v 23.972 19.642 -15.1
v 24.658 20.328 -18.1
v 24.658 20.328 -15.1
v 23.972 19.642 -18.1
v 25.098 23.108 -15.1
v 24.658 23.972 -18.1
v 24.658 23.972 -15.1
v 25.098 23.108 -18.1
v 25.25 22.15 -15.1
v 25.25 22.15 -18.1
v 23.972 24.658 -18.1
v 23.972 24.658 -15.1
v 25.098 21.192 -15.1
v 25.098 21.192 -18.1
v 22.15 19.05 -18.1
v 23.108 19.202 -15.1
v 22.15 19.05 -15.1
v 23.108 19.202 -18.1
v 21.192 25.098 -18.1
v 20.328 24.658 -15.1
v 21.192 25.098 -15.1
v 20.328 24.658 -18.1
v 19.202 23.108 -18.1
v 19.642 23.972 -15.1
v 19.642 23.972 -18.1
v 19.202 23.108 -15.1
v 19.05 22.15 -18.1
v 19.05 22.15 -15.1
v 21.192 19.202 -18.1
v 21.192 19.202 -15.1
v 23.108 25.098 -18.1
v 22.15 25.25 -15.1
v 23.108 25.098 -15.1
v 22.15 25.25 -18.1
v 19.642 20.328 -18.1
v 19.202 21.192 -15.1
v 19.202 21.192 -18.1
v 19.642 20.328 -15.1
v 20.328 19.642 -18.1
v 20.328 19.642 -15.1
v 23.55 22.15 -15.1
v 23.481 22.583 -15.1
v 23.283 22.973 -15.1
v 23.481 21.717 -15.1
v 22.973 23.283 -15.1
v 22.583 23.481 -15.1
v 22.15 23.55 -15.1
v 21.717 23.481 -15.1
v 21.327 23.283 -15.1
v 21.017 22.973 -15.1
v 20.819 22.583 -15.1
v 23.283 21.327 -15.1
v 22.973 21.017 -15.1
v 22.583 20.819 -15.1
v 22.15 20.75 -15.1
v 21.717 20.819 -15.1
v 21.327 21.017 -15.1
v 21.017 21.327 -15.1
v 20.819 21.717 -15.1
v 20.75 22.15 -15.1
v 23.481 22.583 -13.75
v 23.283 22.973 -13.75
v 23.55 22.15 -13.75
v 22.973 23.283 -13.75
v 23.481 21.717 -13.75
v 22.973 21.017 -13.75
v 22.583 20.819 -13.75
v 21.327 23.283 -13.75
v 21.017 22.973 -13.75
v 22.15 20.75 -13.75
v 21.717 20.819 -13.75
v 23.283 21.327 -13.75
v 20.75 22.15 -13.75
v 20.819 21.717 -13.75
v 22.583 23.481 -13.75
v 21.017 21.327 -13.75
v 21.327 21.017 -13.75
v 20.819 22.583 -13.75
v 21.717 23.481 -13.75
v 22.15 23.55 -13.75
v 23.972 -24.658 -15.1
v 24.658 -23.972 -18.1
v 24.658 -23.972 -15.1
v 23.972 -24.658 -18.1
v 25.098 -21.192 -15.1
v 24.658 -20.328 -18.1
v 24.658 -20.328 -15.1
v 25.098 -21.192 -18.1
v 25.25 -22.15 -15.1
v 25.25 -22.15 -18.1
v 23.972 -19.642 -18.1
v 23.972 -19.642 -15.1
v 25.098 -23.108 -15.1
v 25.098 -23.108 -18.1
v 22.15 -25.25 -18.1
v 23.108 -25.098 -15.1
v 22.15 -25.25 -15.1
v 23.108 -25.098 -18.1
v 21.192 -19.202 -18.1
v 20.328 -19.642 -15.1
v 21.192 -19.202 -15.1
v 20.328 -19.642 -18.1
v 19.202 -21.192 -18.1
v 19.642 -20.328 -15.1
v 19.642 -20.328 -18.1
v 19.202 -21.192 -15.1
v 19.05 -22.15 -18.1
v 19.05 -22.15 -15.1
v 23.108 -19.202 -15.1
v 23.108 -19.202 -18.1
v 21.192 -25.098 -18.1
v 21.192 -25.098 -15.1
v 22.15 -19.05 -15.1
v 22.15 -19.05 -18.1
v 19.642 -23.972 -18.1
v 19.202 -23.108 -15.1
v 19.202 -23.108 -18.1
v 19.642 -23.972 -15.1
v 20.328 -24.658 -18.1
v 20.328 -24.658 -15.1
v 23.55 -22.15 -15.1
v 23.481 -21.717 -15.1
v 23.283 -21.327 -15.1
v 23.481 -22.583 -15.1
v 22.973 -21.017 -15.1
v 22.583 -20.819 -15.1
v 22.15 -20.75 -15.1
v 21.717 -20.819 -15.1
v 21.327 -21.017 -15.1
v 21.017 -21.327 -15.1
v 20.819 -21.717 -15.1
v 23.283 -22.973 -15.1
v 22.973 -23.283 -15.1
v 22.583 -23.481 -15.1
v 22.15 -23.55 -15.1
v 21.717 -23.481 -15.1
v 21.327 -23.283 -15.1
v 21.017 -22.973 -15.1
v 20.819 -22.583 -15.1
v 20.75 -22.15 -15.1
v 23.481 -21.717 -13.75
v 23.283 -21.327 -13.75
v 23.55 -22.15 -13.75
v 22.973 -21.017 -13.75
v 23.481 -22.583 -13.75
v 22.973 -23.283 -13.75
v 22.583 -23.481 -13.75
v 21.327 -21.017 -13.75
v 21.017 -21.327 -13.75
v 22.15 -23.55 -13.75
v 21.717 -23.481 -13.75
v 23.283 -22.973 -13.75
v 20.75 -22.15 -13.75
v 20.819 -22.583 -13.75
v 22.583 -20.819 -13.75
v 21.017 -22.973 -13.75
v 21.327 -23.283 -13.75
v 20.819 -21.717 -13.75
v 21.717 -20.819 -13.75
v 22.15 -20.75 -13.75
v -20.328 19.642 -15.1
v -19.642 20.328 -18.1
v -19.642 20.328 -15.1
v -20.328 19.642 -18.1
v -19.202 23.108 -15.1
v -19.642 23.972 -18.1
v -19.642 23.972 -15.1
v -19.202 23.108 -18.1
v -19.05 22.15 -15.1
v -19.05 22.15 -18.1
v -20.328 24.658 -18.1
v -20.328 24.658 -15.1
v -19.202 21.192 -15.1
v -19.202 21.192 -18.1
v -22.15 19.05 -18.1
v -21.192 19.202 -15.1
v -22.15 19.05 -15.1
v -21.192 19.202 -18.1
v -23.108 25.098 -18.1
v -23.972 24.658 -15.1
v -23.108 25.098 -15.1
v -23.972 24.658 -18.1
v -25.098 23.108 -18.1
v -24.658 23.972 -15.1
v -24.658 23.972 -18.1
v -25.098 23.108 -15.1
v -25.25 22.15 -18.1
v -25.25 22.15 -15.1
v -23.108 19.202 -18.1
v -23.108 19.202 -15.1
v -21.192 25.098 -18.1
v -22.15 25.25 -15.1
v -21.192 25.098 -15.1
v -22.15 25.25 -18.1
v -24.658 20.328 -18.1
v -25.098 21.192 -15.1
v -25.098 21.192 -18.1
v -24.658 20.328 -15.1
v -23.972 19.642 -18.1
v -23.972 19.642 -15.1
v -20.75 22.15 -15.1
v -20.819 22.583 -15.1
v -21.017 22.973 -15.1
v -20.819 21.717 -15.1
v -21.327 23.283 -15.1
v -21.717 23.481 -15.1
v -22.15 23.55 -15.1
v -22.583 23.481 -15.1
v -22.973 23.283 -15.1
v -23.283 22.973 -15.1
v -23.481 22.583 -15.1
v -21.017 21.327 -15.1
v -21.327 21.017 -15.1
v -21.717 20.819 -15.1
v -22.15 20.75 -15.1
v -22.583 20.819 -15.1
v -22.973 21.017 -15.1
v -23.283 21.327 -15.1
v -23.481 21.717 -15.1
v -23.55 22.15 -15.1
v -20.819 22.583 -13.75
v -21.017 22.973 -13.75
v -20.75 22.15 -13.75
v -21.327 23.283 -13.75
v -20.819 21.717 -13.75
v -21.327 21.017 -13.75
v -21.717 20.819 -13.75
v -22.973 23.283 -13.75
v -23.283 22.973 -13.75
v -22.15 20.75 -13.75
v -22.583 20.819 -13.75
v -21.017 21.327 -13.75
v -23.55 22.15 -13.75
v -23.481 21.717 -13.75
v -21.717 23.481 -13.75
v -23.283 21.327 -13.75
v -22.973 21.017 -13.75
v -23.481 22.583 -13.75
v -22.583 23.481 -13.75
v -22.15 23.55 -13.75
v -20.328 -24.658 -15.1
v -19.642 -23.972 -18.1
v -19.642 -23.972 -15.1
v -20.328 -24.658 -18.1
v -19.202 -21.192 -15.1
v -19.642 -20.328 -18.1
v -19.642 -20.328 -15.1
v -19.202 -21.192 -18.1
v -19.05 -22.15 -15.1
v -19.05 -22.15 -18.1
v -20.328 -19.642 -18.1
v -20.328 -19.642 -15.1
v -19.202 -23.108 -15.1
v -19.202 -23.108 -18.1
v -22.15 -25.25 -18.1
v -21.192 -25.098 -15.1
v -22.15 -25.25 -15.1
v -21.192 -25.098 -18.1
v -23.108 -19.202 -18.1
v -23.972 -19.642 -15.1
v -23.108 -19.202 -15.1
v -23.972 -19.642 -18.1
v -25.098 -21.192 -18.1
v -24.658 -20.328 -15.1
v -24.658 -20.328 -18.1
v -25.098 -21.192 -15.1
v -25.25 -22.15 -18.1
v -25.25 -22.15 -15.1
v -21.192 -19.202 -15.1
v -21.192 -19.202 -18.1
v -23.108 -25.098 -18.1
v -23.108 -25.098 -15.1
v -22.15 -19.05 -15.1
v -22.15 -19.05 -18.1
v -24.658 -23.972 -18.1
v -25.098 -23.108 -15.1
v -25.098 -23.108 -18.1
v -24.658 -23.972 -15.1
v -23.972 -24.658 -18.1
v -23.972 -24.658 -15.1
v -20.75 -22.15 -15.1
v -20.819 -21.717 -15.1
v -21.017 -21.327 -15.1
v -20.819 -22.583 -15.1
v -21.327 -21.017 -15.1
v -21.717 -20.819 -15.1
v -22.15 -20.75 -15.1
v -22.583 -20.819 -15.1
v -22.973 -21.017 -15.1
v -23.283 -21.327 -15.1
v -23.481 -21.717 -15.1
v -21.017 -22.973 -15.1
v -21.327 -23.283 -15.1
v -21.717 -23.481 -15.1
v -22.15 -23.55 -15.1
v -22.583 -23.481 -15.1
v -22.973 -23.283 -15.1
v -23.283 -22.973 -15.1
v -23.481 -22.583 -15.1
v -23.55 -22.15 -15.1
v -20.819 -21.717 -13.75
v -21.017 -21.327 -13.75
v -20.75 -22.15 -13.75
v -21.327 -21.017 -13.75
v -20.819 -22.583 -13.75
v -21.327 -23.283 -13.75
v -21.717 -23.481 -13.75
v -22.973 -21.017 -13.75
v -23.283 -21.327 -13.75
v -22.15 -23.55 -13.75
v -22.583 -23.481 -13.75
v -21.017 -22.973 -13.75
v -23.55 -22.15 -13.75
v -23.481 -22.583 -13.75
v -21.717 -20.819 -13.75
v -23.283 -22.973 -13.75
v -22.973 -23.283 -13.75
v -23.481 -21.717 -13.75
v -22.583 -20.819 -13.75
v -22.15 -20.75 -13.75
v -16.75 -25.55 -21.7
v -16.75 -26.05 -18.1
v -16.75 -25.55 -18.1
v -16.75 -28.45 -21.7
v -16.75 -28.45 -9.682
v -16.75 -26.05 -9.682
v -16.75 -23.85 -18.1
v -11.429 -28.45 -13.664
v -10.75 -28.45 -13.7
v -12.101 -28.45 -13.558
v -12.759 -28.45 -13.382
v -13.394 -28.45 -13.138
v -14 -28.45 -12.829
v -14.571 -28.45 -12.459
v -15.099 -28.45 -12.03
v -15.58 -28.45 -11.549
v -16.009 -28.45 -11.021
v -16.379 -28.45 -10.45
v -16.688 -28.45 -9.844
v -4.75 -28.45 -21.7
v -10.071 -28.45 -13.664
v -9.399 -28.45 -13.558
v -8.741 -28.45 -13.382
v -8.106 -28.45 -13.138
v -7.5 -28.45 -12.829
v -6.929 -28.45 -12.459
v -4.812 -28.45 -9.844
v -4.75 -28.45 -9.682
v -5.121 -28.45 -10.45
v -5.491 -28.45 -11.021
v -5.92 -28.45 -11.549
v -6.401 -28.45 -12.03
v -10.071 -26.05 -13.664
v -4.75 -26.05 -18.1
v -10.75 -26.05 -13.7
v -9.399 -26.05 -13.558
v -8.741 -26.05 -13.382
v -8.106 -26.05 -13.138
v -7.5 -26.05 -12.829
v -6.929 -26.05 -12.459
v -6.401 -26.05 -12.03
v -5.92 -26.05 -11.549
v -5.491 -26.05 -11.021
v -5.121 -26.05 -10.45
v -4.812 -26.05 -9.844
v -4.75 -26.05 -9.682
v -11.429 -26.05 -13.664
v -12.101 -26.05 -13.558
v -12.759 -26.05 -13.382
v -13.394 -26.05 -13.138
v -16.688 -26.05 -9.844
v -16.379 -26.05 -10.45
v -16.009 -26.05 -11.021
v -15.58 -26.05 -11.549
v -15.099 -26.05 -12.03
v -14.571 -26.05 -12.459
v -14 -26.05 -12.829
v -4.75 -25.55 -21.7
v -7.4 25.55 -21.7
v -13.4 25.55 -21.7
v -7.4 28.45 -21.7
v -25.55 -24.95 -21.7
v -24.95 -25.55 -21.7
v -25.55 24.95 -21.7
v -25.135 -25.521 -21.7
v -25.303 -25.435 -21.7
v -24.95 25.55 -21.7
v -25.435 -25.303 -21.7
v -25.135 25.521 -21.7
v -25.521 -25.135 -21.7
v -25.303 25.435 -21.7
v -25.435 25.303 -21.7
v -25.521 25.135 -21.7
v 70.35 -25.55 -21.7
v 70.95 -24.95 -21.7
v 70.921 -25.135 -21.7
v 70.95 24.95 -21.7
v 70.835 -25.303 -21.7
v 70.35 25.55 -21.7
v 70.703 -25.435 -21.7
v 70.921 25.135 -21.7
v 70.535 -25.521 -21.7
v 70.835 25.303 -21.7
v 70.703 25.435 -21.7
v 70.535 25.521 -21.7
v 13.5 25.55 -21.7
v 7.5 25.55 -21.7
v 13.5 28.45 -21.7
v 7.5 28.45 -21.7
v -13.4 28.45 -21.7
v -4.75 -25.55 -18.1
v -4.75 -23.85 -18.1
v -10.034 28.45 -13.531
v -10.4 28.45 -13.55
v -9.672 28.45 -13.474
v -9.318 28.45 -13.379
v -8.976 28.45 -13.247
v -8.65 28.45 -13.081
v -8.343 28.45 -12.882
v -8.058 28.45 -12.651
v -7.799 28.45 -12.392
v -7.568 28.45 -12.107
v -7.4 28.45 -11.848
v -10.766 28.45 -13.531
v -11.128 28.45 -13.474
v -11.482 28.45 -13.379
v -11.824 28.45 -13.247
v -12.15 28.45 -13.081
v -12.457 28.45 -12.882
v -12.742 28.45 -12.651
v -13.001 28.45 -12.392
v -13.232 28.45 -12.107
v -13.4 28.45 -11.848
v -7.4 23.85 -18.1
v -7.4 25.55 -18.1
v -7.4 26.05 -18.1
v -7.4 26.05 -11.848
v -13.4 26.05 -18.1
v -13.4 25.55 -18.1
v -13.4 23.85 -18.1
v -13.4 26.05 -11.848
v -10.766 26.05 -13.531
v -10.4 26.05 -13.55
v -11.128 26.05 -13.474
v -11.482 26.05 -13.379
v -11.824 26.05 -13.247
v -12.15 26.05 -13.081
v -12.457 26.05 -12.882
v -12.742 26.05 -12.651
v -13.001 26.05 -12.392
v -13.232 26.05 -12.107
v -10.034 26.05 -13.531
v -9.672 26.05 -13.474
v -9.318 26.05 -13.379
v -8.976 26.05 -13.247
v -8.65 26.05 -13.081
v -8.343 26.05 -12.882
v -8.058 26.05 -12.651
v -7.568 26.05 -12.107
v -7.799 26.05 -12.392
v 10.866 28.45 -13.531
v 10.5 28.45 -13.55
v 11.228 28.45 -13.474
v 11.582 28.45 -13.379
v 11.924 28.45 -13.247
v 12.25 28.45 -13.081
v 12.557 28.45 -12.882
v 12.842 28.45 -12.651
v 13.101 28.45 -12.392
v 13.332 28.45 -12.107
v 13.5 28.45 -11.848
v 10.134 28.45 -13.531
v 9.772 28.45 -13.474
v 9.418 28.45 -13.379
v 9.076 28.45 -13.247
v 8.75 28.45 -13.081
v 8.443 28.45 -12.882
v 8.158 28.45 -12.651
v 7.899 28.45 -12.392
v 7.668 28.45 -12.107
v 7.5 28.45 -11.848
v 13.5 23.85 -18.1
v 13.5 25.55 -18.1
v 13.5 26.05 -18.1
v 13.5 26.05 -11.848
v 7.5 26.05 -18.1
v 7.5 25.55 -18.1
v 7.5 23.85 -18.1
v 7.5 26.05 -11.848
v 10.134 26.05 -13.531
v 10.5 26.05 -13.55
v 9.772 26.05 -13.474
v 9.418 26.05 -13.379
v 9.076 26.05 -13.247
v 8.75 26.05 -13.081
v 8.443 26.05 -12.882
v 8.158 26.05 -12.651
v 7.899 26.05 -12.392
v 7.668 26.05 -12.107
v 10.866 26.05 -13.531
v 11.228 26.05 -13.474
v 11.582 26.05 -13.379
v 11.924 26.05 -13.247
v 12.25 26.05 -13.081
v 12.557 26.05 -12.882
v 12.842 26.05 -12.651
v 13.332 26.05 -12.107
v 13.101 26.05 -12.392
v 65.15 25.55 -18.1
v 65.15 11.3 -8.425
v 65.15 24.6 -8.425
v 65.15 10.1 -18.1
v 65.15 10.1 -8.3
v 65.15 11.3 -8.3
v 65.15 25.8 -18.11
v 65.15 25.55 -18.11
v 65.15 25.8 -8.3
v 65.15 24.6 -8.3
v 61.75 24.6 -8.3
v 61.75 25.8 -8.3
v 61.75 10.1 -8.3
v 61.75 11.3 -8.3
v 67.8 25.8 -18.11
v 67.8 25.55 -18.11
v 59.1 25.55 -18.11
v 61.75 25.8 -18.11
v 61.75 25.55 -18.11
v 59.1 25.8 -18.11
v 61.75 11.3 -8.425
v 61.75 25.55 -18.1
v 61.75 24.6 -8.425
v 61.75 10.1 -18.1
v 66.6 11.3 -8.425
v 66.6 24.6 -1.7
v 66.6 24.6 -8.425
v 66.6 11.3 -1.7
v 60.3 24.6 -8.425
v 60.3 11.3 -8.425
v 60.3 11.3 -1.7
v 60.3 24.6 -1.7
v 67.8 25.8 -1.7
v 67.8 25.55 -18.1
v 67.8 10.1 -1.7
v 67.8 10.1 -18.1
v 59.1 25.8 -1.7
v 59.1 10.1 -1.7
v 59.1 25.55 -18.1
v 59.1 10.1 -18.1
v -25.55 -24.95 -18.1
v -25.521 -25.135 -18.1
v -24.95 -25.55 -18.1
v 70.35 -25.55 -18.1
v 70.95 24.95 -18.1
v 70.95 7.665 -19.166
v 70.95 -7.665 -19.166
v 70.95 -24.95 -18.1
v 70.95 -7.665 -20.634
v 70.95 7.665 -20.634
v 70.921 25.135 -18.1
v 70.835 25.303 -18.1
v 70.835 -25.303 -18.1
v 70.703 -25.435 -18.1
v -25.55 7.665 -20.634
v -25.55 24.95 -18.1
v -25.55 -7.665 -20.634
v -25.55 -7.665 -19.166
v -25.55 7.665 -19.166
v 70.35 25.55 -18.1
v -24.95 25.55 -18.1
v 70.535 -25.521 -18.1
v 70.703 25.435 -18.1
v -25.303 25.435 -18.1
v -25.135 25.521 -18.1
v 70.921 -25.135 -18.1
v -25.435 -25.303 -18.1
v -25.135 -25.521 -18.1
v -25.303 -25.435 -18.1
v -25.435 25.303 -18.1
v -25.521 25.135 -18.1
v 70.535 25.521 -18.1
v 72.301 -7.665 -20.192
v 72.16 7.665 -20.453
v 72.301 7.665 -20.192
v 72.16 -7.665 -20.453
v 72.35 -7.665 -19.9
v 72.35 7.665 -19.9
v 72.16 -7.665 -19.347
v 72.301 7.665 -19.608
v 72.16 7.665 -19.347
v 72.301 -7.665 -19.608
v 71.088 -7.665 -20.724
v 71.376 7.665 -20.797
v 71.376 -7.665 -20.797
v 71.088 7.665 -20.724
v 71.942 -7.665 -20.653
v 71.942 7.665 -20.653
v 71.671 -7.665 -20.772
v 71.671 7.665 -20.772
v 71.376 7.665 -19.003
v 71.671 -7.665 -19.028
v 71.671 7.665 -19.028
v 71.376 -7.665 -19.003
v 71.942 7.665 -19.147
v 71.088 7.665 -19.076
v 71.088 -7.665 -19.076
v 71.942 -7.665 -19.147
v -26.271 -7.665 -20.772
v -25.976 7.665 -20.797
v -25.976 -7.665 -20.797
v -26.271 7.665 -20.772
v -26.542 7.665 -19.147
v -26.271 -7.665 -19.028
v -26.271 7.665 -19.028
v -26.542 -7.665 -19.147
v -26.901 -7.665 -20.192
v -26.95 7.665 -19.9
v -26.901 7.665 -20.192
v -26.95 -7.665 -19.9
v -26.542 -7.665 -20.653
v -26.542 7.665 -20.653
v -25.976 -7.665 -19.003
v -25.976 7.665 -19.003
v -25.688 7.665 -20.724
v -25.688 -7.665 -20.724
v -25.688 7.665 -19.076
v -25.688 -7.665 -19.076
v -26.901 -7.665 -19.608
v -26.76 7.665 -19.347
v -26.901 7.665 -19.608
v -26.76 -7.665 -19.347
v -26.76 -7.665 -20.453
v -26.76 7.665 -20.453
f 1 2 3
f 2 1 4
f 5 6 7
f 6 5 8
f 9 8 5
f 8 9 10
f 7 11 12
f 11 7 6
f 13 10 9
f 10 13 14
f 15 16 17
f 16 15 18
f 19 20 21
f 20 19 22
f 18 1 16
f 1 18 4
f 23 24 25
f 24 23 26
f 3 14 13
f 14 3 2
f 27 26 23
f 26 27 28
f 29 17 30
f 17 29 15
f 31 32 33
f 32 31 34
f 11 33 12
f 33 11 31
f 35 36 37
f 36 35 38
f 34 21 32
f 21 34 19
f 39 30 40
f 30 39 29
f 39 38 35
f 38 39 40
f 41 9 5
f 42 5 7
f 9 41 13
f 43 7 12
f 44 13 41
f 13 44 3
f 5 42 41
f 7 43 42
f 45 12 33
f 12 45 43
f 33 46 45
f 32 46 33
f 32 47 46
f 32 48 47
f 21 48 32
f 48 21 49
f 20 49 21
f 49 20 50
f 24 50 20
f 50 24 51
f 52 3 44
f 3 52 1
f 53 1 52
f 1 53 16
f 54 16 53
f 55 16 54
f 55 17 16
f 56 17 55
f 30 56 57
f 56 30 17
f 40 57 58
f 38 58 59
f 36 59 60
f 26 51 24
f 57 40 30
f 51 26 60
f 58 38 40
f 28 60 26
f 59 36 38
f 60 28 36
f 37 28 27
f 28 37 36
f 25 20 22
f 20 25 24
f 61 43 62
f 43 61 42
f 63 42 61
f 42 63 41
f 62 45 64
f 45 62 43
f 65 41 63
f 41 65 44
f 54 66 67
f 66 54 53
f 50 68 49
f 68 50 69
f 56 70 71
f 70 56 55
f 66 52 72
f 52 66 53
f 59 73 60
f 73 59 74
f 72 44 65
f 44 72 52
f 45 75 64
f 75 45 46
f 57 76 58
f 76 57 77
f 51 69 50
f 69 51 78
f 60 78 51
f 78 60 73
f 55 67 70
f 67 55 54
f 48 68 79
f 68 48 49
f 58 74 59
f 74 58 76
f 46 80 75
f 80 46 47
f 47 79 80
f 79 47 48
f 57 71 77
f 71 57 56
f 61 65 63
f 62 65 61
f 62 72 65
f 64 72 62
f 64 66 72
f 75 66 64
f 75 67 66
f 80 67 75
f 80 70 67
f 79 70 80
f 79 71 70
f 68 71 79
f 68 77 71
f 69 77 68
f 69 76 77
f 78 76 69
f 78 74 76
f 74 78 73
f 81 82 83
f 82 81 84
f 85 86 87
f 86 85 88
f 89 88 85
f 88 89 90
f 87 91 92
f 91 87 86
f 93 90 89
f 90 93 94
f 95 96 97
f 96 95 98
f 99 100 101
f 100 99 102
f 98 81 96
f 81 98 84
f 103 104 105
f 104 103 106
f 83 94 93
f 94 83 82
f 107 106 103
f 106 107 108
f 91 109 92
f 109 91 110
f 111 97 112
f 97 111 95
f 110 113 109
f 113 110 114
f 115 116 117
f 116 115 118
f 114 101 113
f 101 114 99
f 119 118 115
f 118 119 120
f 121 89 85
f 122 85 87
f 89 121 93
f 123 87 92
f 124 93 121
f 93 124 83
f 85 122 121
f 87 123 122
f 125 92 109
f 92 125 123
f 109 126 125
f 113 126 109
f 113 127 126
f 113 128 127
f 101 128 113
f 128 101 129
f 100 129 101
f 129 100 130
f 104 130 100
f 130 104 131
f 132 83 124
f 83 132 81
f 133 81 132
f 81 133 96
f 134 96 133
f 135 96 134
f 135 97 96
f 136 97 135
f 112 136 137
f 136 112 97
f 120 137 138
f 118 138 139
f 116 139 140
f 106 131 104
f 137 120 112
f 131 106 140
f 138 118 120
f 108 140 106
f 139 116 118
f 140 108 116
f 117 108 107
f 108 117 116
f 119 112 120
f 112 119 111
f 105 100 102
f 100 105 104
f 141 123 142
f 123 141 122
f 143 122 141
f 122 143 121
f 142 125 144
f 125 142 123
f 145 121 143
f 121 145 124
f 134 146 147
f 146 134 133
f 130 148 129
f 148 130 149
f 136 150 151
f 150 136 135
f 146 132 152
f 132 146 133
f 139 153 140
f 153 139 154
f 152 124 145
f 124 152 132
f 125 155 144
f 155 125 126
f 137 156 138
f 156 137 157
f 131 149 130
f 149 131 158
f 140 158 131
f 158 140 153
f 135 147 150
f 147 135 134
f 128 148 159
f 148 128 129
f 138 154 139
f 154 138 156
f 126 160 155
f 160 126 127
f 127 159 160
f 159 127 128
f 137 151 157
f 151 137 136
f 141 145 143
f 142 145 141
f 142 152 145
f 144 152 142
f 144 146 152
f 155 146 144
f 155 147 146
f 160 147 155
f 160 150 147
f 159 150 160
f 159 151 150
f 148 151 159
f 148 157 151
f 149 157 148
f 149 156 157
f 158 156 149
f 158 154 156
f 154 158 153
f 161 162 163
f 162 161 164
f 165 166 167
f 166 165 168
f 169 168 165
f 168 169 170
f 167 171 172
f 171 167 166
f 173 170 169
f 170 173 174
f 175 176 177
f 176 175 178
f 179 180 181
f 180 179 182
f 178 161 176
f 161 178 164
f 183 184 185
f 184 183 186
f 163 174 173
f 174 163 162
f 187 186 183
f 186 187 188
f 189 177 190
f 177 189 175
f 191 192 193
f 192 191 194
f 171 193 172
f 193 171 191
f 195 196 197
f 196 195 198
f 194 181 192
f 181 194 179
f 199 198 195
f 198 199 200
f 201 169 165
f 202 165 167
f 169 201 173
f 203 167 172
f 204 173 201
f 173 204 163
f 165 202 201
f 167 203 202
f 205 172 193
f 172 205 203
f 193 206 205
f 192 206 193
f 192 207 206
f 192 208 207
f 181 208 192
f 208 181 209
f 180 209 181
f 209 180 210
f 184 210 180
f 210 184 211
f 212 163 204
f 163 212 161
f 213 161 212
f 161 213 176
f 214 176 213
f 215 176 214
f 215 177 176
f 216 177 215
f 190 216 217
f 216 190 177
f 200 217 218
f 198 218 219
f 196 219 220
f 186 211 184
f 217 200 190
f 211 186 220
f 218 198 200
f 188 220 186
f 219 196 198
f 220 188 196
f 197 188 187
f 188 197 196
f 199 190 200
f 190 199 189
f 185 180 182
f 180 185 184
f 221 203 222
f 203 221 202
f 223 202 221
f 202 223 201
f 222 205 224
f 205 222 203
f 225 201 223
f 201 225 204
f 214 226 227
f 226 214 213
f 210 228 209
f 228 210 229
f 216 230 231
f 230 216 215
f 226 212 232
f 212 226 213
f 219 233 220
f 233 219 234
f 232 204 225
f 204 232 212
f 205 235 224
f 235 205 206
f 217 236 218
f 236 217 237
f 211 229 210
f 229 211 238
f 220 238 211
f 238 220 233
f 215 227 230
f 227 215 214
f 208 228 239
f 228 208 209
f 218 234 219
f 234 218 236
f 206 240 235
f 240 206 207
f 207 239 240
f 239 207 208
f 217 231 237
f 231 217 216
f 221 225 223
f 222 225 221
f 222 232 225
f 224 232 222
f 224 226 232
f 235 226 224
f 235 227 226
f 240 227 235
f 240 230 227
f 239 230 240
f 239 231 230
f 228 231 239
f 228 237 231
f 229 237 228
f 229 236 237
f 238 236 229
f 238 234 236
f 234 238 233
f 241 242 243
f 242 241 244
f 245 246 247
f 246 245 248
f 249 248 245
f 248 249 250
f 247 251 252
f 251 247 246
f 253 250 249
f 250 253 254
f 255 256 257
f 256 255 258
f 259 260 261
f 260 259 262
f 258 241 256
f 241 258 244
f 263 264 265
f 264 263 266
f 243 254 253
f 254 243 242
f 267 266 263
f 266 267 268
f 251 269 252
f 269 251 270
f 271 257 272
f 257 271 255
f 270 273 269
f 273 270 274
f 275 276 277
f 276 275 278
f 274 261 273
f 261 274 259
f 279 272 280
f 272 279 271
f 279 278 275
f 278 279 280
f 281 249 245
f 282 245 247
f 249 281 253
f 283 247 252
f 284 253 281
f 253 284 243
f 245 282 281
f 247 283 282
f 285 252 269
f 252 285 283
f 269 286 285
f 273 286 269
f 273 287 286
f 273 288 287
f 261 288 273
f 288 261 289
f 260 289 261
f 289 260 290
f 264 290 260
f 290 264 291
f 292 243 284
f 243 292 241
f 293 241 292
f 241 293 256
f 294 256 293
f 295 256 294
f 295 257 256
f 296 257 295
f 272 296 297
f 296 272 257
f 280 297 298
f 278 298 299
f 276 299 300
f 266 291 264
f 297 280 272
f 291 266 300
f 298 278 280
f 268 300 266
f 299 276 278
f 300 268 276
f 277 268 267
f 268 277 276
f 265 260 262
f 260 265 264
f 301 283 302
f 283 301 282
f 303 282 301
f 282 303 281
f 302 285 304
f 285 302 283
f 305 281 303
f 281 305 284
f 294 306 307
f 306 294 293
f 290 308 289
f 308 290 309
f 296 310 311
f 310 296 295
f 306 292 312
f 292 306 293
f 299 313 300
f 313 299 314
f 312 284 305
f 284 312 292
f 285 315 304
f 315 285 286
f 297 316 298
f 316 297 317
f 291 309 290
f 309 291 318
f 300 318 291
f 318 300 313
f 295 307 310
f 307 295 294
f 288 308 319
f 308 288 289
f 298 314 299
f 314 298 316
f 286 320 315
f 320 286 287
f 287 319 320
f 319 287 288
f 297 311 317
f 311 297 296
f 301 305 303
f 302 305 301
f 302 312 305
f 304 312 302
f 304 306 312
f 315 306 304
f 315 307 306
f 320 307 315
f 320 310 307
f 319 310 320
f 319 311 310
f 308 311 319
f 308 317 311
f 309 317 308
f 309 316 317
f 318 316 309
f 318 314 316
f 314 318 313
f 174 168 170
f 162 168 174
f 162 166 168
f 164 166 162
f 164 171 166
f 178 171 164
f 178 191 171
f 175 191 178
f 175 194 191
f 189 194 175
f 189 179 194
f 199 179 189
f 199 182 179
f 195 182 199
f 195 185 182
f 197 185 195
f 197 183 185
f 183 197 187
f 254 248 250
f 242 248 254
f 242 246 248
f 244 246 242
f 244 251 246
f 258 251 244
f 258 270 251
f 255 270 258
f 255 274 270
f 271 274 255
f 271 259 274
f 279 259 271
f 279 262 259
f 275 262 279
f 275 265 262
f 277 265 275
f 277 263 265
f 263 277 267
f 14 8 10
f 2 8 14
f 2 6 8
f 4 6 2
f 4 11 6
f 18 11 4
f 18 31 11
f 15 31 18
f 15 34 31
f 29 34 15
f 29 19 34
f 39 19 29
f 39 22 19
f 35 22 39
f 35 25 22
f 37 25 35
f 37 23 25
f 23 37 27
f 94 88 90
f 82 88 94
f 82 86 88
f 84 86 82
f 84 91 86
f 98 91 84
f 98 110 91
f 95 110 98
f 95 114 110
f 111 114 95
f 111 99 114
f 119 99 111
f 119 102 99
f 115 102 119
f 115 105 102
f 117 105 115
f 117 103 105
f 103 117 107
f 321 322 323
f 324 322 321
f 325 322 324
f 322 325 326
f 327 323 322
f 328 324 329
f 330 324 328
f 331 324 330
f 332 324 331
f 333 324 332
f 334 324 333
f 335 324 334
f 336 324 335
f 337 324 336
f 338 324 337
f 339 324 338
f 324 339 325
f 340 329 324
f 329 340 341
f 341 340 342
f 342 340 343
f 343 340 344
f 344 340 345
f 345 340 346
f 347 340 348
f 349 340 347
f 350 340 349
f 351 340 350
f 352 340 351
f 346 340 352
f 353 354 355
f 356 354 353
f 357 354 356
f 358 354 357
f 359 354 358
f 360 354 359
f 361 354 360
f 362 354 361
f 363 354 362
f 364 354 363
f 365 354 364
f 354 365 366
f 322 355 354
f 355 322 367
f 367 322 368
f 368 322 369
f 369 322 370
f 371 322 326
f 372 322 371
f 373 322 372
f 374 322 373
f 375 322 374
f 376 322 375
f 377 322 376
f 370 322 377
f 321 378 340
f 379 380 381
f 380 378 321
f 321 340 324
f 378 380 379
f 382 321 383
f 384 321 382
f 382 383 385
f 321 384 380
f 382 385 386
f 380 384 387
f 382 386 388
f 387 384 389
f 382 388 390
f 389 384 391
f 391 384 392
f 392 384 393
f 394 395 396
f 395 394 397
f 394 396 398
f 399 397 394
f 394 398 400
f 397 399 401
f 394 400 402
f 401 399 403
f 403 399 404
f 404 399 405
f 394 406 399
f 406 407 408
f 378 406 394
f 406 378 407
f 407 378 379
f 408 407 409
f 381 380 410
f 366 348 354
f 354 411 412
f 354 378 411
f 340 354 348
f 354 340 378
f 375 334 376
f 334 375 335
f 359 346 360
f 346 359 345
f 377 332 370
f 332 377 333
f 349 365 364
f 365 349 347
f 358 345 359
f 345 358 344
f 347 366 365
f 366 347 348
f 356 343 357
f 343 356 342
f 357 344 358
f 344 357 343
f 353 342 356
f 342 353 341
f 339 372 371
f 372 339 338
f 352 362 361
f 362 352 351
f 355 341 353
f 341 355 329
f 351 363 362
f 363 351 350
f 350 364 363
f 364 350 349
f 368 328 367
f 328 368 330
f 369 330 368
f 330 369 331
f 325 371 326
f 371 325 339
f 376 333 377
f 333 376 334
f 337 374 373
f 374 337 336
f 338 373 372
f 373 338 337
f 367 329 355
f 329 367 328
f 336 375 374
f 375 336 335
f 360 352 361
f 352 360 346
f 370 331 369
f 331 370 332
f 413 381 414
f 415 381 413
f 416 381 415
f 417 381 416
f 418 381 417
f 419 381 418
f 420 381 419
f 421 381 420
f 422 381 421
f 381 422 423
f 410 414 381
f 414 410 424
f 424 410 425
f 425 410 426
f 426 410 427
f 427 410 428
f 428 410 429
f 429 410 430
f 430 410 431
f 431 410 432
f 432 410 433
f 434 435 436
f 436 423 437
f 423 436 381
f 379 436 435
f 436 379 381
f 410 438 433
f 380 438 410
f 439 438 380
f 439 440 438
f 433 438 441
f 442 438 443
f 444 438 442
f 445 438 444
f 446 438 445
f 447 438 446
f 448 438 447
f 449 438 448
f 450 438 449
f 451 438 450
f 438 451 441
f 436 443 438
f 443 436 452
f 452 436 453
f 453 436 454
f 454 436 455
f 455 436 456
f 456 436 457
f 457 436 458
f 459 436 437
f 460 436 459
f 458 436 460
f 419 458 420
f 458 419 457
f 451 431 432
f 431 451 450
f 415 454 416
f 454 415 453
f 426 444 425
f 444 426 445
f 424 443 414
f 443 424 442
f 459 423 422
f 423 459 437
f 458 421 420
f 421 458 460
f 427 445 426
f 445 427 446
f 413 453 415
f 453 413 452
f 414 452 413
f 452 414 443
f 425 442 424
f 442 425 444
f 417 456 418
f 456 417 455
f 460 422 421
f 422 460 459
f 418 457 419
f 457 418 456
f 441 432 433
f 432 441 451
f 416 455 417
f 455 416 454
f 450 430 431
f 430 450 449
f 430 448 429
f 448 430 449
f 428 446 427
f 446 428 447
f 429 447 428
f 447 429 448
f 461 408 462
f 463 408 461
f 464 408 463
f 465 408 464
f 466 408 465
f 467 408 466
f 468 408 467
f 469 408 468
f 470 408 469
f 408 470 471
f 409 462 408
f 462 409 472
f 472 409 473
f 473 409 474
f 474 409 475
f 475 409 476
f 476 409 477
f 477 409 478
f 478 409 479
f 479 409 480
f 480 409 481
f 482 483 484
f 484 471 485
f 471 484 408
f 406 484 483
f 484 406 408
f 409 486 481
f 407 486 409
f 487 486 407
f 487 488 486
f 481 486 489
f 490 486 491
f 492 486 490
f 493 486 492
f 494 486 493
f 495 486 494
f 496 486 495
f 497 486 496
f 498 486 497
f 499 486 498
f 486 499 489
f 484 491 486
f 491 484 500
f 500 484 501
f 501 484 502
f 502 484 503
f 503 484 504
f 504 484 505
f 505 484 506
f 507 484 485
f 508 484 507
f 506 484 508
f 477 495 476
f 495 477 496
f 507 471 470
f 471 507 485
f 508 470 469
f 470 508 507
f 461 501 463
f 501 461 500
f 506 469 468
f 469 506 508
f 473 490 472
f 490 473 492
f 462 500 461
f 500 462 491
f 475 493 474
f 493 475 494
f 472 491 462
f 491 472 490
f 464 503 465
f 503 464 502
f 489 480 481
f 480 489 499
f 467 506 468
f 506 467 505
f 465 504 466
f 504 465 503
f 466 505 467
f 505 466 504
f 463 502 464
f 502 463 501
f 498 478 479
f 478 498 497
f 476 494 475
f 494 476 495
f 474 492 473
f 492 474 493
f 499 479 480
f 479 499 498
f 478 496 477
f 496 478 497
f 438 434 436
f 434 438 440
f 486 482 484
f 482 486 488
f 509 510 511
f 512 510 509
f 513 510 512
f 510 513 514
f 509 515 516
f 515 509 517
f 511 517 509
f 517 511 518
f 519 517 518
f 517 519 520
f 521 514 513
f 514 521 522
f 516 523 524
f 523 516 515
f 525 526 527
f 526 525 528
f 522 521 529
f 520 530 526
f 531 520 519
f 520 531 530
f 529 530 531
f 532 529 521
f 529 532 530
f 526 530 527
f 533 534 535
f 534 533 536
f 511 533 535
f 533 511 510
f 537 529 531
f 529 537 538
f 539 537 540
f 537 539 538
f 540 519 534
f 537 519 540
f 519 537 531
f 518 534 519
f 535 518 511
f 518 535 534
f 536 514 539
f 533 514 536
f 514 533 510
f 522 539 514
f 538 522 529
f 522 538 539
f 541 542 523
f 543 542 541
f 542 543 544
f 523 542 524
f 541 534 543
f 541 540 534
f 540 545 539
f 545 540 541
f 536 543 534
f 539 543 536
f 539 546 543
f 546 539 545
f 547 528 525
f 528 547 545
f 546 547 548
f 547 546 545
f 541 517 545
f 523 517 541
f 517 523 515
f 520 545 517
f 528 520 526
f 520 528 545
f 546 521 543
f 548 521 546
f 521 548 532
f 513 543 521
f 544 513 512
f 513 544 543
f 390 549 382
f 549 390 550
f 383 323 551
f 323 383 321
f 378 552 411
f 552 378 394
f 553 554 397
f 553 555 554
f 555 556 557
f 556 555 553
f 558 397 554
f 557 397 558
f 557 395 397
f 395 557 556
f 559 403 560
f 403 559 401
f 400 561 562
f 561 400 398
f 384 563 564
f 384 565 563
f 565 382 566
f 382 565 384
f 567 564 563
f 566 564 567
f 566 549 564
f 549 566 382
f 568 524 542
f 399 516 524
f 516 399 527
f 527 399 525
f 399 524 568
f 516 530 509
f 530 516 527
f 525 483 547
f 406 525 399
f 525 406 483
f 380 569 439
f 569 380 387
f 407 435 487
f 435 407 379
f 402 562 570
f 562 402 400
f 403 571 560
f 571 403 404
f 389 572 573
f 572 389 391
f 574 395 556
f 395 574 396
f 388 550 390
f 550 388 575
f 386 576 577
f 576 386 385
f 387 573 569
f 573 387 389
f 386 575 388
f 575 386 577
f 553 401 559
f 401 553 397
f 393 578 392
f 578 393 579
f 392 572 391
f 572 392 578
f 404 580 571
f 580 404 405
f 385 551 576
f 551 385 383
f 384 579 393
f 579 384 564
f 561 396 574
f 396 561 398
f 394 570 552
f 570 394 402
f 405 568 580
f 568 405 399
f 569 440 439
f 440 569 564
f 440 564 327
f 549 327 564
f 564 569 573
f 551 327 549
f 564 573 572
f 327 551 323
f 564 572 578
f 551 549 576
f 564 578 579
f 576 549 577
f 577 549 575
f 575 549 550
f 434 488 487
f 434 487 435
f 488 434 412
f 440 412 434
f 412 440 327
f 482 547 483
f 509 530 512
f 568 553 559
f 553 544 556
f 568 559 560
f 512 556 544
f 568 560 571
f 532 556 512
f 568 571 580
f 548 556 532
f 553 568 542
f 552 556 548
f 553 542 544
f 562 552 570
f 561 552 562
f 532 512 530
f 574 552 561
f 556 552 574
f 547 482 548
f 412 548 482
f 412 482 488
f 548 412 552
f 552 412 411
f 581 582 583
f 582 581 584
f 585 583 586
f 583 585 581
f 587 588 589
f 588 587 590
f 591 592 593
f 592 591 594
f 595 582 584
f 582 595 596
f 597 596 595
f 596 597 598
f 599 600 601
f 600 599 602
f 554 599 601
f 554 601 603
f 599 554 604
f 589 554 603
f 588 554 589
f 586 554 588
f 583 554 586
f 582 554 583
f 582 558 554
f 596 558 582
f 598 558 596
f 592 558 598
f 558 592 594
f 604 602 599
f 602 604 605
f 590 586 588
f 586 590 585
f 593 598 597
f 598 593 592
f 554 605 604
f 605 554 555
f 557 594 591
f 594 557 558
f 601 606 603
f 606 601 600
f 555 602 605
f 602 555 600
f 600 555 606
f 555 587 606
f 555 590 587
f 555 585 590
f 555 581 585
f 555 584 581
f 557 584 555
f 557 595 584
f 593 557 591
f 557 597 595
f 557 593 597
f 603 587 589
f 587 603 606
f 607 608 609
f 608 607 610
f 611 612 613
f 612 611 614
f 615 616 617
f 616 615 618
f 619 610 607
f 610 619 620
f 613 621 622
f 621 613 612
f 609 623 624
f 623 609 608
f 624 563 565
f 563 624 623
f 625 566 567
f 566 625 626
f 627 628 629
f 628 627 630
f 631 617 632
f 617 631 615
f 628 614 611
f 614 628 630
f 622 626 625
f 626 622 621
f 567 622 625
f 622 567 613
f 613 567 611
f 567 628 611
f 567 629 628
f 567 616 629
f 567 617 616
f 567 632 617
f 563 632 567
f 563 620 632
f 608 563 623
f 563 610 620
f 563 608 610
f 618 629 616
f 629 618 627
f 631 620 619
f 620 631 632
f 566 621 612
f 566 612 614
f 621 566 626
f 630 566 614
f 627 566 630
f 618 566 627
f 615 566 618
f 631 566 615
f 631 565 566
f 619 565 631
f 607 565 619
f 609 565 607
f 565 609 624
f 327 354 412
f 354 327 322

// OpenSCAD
//
//  case for "pixie" 2 transistor 40 m band transceiver
//
//  design by Egil Kvaleberg, 8 Jun 2015
//
//  note:
//  design origin is center of pcb, underside of top cover surface

part = "bottom"; // [ demo, all, top, bottom, key, ring ]
with_battery = 1; // [ 1:true, 0:false ] 
with_key = 1; // [ 1:true, 0:false ] 

uswitch_width = 5.8; // microswitch case width
uswitch_depth = 12.8; // microswitch case depth
uswitch_height = 6.6; // microswitch case height
key_travel = 1.0; // microswitch switch travel, with some margin

/* [Hidden] */
batt = [26.0, 53.0, 17.0]; // 

pcb = [51.1, 51.1, 1.6];

pcbmntdia = 3.8; // net
pcbmntdx = 40.5 + pcbmntdia;
pcbmntdy = 40.5 + pcbmntdia;

pcb2bot = 3.0; // room from bottom pcb to bottom cover
pcb2top = 13.5; // room from top pcb to top cover

bncdia = 12.0;
bncpos = (7.5+14.6/2)-pcb[0]/2; // from lower r corner 
bncheight = 12.0/2 + 0.3; // height of centre from top PCB

jackdia = 6.0;
jack1pos = (9.4+11.5/2)-pcb[0]/2; 
jack2pos = pcb[0]/2-(9.3+11.5/2); 
jackheight = 6.6/2 + 0.15; // height of centre from top PCB

powerpos = pcb[0]/2-(10.6+8.9/2); 
powerdx = 1*9.0;
powerdz = 1*11.0;

trimpos = [pcb[0]/2-21.8, pcb[1]/2-21.0];
trimdia = 5.5;
trimhgt = 8.0;

snap_dia = 1.8; // snap lock ridge diameter
snap_len_y = pcb[1]*0.3; // snap lock length
snap_len_x = pcb[0]*0.3;

key_x = 12;
key_y = 25;
uswitch = [uswitch_width, uswitch_depth, uswitch_height];

wall = 1.2;
caser = wall;
twall = 1.2; // wall size of top 
bwall = 3.6; // wall size of bottom 

tol = 0.5;
d = 0.01;


extra_x = (with_battery ? batt[0]+wall+2*tol : 0) + (with_key ? key_x+wall+8*tol : 0); // extra space in X

module nut(af, h) { // af is 2*r
	cylinder(r=af/2/cos(30), h=h, $fn=6);
}

module c_cube(x, y, z) {
	translate([-x/2, -y/2, 0]) cube([x, y, z]);
}

module cr_cube(x, y, z, r) {
	hull() {
		for (dx=[-1,1]) for (dy=[-1,1]) translate([dx*(x/2-r), dy*(y/2-r), 0]) cylinder(r=r, h=z, $fn=20);
	}
}

module cr2_cube(x, y, z, r1, r2) {
	hull() {
		for (dx=[-1,1]) for (dy=[-1,1]) translate([dx*(x/2-r1), dy*(y/2-r1), 0]) cylinder(r1=r1, r2=r2, h=z, $fn=20);
	}
}

module snap2(adia, alen) {
		translate([pcb[0]/2+tol, -(snap_len_y+alen)/2, -(pcb2top+pcb[2]+pcb2bot+bwall/2)]) rotate([-90, 0, 0]) cylinder(r=(snap_dia+adia)/2, h=snap_len_y+alen, $fs=0.3);
		//translate([-(snap_len_x+alen)/2, pcb[1]/2+tol, -(pcb2top+pcb[2]+pcb2bot+bwall/2)]) rotate([0, 90, 0]) cylinder(r=(snap_dia+adia)/2, h=snap_len_x+alen, $fs=0.3);
}

//uswitch = [5.8, 12.8, 6.6]
module uswitch_bed() { // microswitch bed 
	h = d+pcb2bot+pcb[2]+pcb2top-tol-twall;
	if (with_key) {
		translate([pcb[0]/2+tol+(with_battery ? wall+batt[0]+2*tol : 0)+wall+4*tol+key_x/2, pcb[1]/2 - uswitch[1]/2-wall, -(d+pcb2bot+pcb[2]+pcb2top)])
			difference () {
				c_cube(uswitch[0]+tol+2*wall, uswitch[1]+tol+2*wall, h); // mounting bed outer
				union () {
					c_cube(uswitch[0]-2*wall, uswitch[1]+tol+2*wall+2*d, h-uswitch[2]); // room for contacts and wires
					translate([0, 0, h-uswitch[2]-tol/4]) c_cube(uswitch[0]+tol, uswitch[1]+tol, uswitch[2]+tol); // mounting hole
				}
			}
	}
}

peglen = 3* wall; // length beyond key 
pegsiz = pcb[1]*0.1; // BUG: subst

module ring() { // lock ring
	flex = 2.0;
	difference () {
		union () {
			cylinder(h=wall, r=pegsiz/2 + wall, $fn=32);
			translate([pegsiz/2+wall*0.3, (pegsiz-flex)/2+1.5*wall, 0]) cylinder(h=wall, r=1.5*wall, $fn=16);
			translate([pegsiz/2+wall*0.3, -(pegsiz-flex)/2-1.5*wall, 0]) cylinder(h=wall, r=1.5*wall, $fn=16);
		}
		translate([0, 0, -d]) {
			cylinder(h=wall+2*d, r=pegsiz/2, $fn=32);
			translate([pegsiz/2, 0, 0]) c_cube(pegsiz, pegsiz-flex, wall+2*d);
			translate([pegsiz/2+wall*0.3, (pegsiz-flex)/2+1.5*wall, 0]) cylinder(h=wall+2*d, r=0.7*wall, $fn=16);
			translate([pegsiz/2+wall*0.3, -(pegsiz-flex)/2-1.5*wall, 0]) cylinder(h=wall+2*d, r=0.7*wall, $fn=16);
		}
	}
}

module mkey_peg(air) { // morse key mounting peg
	if (with_key) {
		translate([pcb[0]/2+tol+(with_battery ? wall+batt[0]+2*tol : 0)+wall+4*tol+key_x/2, -pcb[1]*0.4, -air-wall-peglen-tol]) {
			if (air != 0) {
				c_cube(pcb[1]*0.1+air, pcb[1]*0.1+air, air+peglen+wall+tol+d); // mounting hole
			} else {
				cylinder(r=pegsiz/2, h=air+peglen+wall+tol+d, $fn=32); // mounting hole
				c_cube(pcb[1]*0.1+air, pcb[1]*0.1+air, air+peglen-wall-tol); // mounting hole
				translate([0, 0, air+peglen]) c_cube(pcb[1]*0.1+air, pcb[1]*0.1+air, wall+tol+d); // mounting hole
			}
		}
	}
}

module mkey_support() { // morse key support (towards mounting peg) 
	if (with_key) difference () {
		translate([pcb[0]/2+tol+(with_battery ? wall+batt[0]+2*tol : 0)+wall+4*tol+key_x/2, -pcb[1]*0.4, -(d+pcb2bot+pcb[2]+pcb2top)])
				c_cube(pcb[1]*0.1+2*tol+2*wall, pcb[1]*0.1+2*tol*2*wall, d+pcb2bot+pcb[2]+pcb2top-tol-twall); // mounting hole
		mkey_peg(tol);
	}
}

module mkey(air) { // morse key
	module curve() {
		r = 25.0 / 2; // a bit more than a typical human finger
		if (air == 0) translate([0, key_y/2 + d, twall+tol+twall+sqrt(pow(r,2) - pow(key_x/2-wall,2))]) rotate([90, 0, 0]) {
			cylinder(r=r, h=d+key_y-key_x/2, $fn=80);
			translate([0, 0, d+key_y-key_x/2]) sphere(r=r, $fn=80);
		}
	}
	if (with_key) {
		translate([pcb[0]/2+tol+(with_battery ? wall+batt[0]+2*tol : 0)+wall+4*tol+key_x/2, pcb[1]/2+tol+wall - key_y/2, -twall-tol]) {
			translate([0, -(wall+tol), 0]) 
				c_cube(key_x+6*tol, key_y, twall); // base frame, covering air gap on sides
			difference() {
				union () {
					translate([0, -(wall+tol)/2, 0])	c_cube(key_x, key_y-(wall+tol), twall+tol+twall); // body
					translate([0, 0, key_travel]) c_cube(key_x+2*air, key_y+2*air, twall+tol+twall-key_travel); //top, extending to edge of case BUG: build issues
				}
				curve();
			}
			if (air != 0) c_cube(key_x+2*air, key_y+2*air, twall+tol+twall+d); // opening in front
			
		}
		if (air == 0) difference () { // arm
			translate([pcb[0]/2+tol+(with_battery ? wall+batt[0]+2*tol : 0)+wall+4*tol+key_x/2, 0, -twall-tol])c_cube(key_x*0.8, pcb[1], twall); // arm
			mkey_peg(tol); // mounting hole
		}
	}
}

module top() {
	sidewalls();

	difference() {
		union() {
			// lid
			translate([extra_x/2, 0, 0]) 
				cr_cube(pcb[0]+2*wall+2*tol+extra_x, pcb[1]+2*wall+2*tol, twall, caser);

			// PCB upper supports
			for (dx=[pcbmntdx/2, -pcbmntdx/2]) for (dy=[pcbmntdy/2, -pcbmntdy/2]) {
				// 
				translate([dx, dy, -(pcb2top-tol)]) {
					cylinder(r1=pcbmntdia/2+wall, r2=pcbmntdia/2+2.5*wall, h=pcb2top, $fn=20);
				}
			}
			// trimmer access tube 
			translate([trimpos[0], trimpos[1], -(pcb2top-trimhgt-tol)]) 
				cylinder(r=trimdia/2+tol/2+wall, r2=trimdia/2+tol/2+2*wall, h=(pcb2top-trimhgt-tol)+d, $fn=20);
			// morse key mounting peg, if applicable
			mkey_peg(0);  

		}
		union () { // subtract:
			// hole for trimmer 
			translate([trimpos[0], trimpos[1], -pcb2top]) {
				cylinder(r=trimdia/2+tol/2, h=pcb2top+twall+d, $fn=20);
			}
			translate([trimpos[0], trimpos[1], 0]) {
				cylinder(r1=trimdia/2+tol/2, r2=trimdia/2+tol/2+wall, h=twall+d, $fn=20);
			}
			// hole for key
			mkey(tol);
		}
	}

	//color("red") mkey(0);	 
}

module sidewalls() {
	difference() {
		union () { // add:
			translate([extra_x/2, 0, /*-(bwall+pcb2bot+pcb[2]+pcb2top)*/twall]) {
				rotate([180, 0, 0]) 
				cr2_cube(pcb[0]+2*wall+2*tol+extra_x, pcb[1]+2*wall+2*tol, (bwall+pcb2bot+pcb[2]+pcb2top+twall), caser, caser+wall);
			}
		}
		union() { // subtract:
			translate([extra_x, 0, 0]) snap2(tol/2, 2*tol);
			rotate([0,0,180]) snap2(tol/2, 2*tol);
			// room for bottom lid
			translate([extra_x/2, 0, -pcb2bot-pcb[2]-pcb2top-bwall-d]) cr_cube(pcb[0]+2*tol+extra_x, pcb[1]+2*tol, d+bwall+tol, caser/2); 
			// room for everything in top wall
			translate([extra_x/2, 0, -d]) cr_cube(pcb[0]+2*wall+4*tol+extra_x, pcb[1]+2*wall+4*tol, twall+2*d, caser+tol);
			// room for pcb
			translate([0, 0, -pcb2bot-pcb[2]-pcb2top]) c_cube(pcb[0]+2*tol, pcb[1]+2*tol, pcb2bot+pcb[2]+pcb2top+d); 
			// room for battery
			if (with_battery) translate([pcb[0]/2+tol+wall+batt[0]/2+tol, 0, -pcb2bot-pcb[2]-pcb2top]) c_cube(batt[0]+2*tol, pcb[1]+2*tol, pcb2bot+pcb[2]+pcb2top+d); 
			// room for key mechanism and key
			if (with_key) translate([pcb[0]/2+tol+(with_battery ? wall+batt[0]+2*tol : 0)+wall+4*tol+key_x/2, 0, -pcb2bot-pcb[2]-pcb2top]) c_cube(key_x+8*tol, pcb[1]+2*tol, pcb2bot+pcb[2]+pcb2top+d);
			mkey(tol);

			// BNC hole
			translate([bncpos, -pcb[1]/2, -pcb2top+bncheight]) rotate([90,0,0]) {
				cylinder(r=bncdia/2+tol, h=tol+2*wall, $fn=60); 
				// also cut out bottom...
				translate([0, -20.0/2, 0]) c_cube(bncdia+2*tol, 20.0, tol+2*wall);
			}
			// jack holes
			for (dx = [jack1pos, jack2pos]) translate([dx, pcb[1]/2, -pcb2top+jackheight]) rotate([-90,0,0]) {
				cylinder(r=jackdia/2+tol, h=tol+2*wall, $fn=60); 
				// also cut out bottom...
				translate([0, 20.0/2, 0]) c_cube(jackdia+2*tol, 20.0, tol+2*wall);
			}

			// hole for power plug
			translate([powerpos, -pcb[1]/2, -pcb2top+powerdz/2]) rotate([90,0,0]) c_cube(powerdx+2*tol, powerdz+2*tol, tol+2*wall);

			// holes for wires through inner wall
			for (dy= [pcb[1]/2+tol-7.0/2, -(pcb[1]/2+tol-7.0/2)]) {
				if (with_battery) translate([pcb[0]/2, dy, -pcb2top+1.5]) rotate([0, 90, 0]) cylinder(r=7.0/2, h = 2*tol+wall); 
				if (with_key) translate([pcb[0]/2+(with_battery ? batt[0]+wall+2*tol : 0), dy, -pcb2top+1.5]) rotate([0, 90, 0]) cylinder(r=7.0/2, h = 2*tol+wall);
			}
			// hole for power switch
			if (with_key && with_battery) translate([pcb[0]/2+batt[0]+2*wall+7*tol+key_x/2, -pcb[1]/2, -pcb2top+0.0]) rotate([90, 0, 0]) cylinder(r=7.0/2, h = tol+2*wall, $fn=30);
		}
	}

}

module bottom() {
	module support(dx, dy) {
		translate([dx, dy, -(d+pcb2bot+pcb[2]+pcb2top)]) {
			cylinder(r=pcbmntdia/2+wall, h=d+pcb2bot, $fn=20);
			cylinder(r=pcbmntdia/2-tol, h=d+pcb2bot+pcb[2]-tol/2, $fn=20);
		}
	}

	// bottom lid
	translate([extra_x/2, 0, -(bwall+pcb2bot+pcb[2]+pcb2top)]) {
		cr_cube(pcb[0]+extra_x, pcb[1], bwall, caser/2);
	}
	translate([extra_x, 0, 0]) snap2(0, 0);
	rotate([0,0,180]) snap2(0, 0);
	intersection () {
		translate([0, 0, -(pcb2bot+pcb[2]+pcb2top)]) {
			cr_cube(pcb[0], pcb[1], pcb2bot+pcb[2], caser/2);
		}
		union () {	
			for (dx=[pcbmntdx/2, -pcbmntdx/2]) for (dy=[pcbmntdy/2, -pcbmntdy/2]) {
				support(dx, dy);	
			}
		}
	}

	// BNC lower part, minus hole
	translate([bncpos, -pcb[1]/2, -pcb2top-pcb[2]-pcb2bot-bwall]) c_cube(bncdia, 2*(tol+wall), bwall);
	difference () {
		translate([bncpos, -pcb[1]/2-tol, -pcb2top-pcb[2]-pcb2bot-bwall+(pcb2bot+bwall+bncheight)/2]) rotate([90,0,0]) c_cube(bncdia, (pcb2bot+bwall+bncheight), 2*wall); 
		translate([bncpos, -pcb[1]/2, -pcb2top+bncheight]) rotate([90,0,0]) cylinder(r=bncdia/2+tol, h=tol+2*wall+d, $fn=60); 
	}
   // jack lower part, minus hole
	for (dx = [jack1pos, jack2pos]) {
		translate([dx, pcb[1]/2, -pcb2top-pcb[2]-pcb2bot-bwall]) c_cube(jackdia, 2*(tol+wall), bwall);
		difference () {
			translate([dx, pcb[1]/2+tol, -pcb2top-pcb[2]-pcb2bot-bwall+(pcb2bot+bwall+jackheight)/2]) rotate([-90,0,0]) c_cube(jackdia, (pcb2bot+bwall+jackheight), 2*wall); 
			translate([dx, pcb[1]/2, -pcb2top+jackheight]) rotate([-90,0,0]) cylinder(r=jackdia/2+tol, h=tol+2*wall+d, $fn=60);
		} 
	}
	// morse key support peg, replaced by lock ring 
	if (false) mkey_support();
   // microswitch bed
	uswitch_bed();
}


if (part=="demo") {
	color("red") mkey(0);
	top();
}
if (part=="top") rotate([180, 0, 0]) top();

if (part=="demo" || part=="bottom") bottom();

if (part=="demo") color("green") {
	translate([-pcb[0]/2, -pcb[1]/2, -pcb2top-pcb[2]]) cube(pcb); 
}

if (part=="key") mkey(0);
if (part=="ring") ring(0);

if (part=="all") {
	translate([-pcb[0]/2-wall-4, 0, bwall]) rotate([0, 180, 0]) top();
	translate([pcb[0]/2+wall+4, 0, pcb2top+pcb[2]+pcb2bot+wall+tol]) bottom();
}
